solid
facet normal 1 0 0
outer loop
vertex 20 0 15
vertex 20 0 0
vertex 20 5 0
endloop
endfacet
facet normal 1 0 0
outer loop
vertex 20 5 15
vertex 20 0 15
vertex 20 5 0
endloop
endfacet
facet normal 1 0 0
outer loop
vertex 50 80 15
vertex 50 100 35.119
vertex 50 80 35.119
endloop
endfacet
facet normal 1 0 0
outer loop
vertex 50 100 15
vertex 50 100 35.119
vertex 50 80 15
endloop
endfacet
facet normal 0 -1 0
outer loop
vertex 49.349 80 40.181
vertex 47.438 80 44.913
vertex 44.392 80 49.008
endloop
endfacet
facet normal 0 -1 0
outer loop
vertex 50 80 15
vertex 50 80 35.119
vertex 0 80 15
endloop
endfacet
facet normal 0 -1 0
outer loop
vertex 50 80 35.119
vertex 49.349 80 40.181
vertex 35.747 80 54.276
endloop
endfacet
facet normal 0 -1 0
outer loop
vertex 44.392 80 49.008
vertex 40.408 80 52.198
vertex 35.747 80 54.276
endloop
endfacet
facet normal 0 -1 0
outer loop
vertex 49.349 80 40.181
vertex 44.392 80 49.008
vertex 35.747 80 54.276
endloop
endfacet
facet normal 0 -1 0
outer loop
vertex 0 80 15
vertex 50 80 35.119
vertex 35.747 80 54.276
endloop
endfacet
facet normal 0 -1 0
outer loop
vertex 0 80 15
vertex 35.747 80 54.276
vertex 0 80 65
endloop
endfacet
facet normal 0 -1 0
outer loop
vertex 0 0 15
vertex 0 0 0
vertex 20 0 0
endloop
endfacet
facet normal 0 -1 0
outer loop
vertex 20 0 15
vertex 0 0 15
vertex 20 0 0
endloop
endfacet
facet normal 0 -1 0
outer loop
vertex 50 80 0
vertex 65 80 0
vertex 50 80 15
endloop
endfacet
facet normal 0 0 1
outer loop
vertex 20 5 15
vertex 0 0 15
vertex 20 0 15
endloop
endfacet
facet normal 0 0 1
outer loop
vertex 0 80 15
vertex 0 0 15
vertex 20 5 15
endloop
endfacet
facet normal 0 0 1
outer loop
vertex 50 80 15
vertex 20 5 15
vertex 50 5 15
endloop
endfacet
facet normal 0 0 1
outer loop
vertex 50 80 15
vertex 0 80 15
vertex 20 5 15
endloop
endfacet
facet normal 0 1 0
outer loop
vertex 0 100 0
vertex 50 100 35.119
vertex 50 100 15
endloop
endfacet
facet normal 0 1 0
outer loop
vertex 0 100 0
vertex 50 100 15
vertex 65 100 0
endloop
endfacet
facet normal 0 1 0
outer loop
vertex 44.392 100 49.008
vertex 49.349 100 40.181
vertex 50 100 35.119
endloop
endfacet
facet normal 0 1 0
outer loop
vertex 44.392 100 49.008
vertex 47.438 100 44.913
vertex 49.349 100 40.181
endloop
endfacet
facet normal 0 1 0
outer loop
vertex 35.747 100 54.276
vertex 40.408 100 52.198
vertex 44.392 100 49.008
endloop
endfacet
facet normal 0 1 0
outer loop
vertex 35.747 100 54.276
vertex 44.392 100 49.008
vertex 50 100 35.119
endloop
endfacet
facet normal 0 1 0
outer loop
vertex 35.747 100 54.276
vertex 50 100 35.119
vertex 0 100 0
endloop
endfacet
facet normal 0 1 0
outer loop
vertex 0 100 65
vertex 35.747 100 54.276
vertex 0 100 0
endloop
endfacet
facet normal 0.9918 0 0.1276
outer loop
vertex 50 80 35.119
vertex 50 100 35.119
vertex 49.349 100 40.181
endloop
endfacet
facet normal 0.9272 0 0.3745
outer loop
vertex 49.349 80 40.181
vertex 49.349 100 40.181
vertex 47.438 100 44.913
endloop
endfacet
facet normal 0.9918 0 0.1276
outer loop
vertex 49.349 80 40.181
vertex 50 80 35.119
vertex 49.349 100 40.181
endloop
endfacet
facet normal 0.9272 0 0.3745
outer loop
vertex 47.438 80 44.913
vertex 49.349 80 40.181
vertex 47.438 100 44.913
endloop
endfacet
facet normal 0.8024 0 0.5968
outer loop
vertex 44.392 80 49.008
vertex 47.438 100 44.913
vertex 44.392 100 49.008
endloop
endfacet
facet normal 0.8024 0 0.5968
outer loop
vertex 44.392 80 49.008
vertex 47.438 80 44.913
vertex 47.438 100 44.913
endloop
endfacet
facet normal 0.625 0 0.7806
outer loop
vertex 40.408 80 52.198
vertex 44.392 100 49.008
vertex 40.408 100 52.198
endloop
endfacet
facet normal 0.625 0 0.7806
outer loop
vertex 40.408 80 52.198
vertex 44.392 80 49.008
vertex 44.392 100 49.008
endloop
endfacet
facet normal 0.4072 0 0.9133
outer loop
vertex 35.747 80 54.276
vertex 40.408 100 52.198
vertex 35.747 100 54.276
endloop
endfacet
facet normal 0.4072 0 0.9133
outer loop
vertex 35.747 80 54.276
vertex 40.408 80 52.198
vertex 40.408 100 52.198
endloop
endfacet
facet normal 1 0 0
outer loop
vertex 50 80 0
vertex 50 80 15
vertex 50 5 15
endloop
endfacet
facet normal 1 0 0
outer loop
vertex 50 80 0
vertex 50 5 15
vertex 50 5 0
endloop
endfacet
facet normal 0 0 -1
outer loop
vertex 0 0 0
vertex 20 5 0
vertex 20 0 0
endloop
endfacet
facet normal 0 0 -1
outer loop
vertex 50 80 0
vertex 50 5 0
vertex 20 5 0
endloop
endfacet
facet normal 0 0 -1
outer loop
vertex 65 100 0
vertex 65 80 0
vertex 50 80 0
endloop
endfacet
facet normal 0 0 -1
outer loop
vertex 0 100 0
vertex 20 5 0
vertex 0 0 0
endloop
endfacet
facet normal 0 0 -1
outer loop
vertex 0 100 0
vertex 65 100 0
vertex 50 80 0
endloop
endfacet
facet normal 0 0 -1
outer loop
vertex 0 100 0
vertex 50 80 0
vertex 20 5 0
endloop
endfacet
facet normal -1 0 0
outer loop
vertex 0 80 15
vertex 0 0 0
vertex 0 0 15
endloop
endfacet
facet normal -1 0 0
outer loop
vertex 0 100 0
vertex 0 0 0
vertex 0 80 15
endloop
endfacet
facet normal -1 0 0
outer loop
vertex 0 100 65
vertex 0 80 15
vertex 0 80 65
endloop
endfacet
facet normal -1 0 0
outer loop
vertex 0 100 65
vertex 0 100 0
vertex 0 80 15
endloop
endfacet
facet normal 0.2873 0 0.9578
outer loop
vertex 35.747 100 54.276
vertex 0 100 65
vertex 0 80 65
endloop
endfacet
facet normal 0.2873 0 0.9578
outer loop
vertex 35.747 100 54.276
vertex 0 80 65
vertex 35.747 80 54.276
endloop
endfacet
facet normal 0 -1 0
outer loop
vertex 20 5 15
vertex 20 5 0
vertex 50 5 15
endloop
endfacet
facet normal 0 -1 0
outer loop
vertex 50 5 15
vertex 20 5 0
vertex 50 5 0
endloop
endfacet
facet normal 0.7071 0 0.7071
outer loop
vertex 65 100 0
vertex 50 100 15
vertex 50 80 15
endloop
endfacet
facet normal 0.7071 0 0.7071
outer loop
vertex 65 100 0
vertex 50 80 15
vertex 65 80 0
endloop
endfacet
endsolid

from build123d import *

# Parameters (mm, degrees)
F1_DEPTH = 15
F3_DEPTH = 20
F4_R     = 20
F6_DEPTH = 20


with BuildPart() as f1:
    # F0 (on Top) → F1 (new body)
    with BuildSketch(Plane.XY):
        Polygon((0, 100), (0, 0), (20, 0), (20, 5), (50, 5), (50, 100), align=None)
    extrude(amount=F1_DEPTH)

    # F2 (on face) → F3 (join)
    with BuildSketch(Plane(origin=(0, 100, 0), x_dir=(-1, 0, 0), z_dir=(0, 1, 0))):
        Polygon((-50, 15), (0, 15), (0, 65), (-50, 50), align=None)
    extrude(amount=-F3_DEPTH)

    # F4
    f4_edges = [f1.edges().sort_by_distance(p)[0] for p in [
        (50, 90, 50),
    ]]
    fillet(f4_edges, radius=F4_R)

    # F5 (on face) → F6 (join)
    with BuildSketch(Plane(origin=(0, 100, 0), x_dir=(-1, 0, 0), z_dir=(0, 1, 0))):
        Polygon((-65, 0), (-50, 0), (-50, 15), align=None)
    extrude(amount=-F6_DEPTH)


solid = f1.part
